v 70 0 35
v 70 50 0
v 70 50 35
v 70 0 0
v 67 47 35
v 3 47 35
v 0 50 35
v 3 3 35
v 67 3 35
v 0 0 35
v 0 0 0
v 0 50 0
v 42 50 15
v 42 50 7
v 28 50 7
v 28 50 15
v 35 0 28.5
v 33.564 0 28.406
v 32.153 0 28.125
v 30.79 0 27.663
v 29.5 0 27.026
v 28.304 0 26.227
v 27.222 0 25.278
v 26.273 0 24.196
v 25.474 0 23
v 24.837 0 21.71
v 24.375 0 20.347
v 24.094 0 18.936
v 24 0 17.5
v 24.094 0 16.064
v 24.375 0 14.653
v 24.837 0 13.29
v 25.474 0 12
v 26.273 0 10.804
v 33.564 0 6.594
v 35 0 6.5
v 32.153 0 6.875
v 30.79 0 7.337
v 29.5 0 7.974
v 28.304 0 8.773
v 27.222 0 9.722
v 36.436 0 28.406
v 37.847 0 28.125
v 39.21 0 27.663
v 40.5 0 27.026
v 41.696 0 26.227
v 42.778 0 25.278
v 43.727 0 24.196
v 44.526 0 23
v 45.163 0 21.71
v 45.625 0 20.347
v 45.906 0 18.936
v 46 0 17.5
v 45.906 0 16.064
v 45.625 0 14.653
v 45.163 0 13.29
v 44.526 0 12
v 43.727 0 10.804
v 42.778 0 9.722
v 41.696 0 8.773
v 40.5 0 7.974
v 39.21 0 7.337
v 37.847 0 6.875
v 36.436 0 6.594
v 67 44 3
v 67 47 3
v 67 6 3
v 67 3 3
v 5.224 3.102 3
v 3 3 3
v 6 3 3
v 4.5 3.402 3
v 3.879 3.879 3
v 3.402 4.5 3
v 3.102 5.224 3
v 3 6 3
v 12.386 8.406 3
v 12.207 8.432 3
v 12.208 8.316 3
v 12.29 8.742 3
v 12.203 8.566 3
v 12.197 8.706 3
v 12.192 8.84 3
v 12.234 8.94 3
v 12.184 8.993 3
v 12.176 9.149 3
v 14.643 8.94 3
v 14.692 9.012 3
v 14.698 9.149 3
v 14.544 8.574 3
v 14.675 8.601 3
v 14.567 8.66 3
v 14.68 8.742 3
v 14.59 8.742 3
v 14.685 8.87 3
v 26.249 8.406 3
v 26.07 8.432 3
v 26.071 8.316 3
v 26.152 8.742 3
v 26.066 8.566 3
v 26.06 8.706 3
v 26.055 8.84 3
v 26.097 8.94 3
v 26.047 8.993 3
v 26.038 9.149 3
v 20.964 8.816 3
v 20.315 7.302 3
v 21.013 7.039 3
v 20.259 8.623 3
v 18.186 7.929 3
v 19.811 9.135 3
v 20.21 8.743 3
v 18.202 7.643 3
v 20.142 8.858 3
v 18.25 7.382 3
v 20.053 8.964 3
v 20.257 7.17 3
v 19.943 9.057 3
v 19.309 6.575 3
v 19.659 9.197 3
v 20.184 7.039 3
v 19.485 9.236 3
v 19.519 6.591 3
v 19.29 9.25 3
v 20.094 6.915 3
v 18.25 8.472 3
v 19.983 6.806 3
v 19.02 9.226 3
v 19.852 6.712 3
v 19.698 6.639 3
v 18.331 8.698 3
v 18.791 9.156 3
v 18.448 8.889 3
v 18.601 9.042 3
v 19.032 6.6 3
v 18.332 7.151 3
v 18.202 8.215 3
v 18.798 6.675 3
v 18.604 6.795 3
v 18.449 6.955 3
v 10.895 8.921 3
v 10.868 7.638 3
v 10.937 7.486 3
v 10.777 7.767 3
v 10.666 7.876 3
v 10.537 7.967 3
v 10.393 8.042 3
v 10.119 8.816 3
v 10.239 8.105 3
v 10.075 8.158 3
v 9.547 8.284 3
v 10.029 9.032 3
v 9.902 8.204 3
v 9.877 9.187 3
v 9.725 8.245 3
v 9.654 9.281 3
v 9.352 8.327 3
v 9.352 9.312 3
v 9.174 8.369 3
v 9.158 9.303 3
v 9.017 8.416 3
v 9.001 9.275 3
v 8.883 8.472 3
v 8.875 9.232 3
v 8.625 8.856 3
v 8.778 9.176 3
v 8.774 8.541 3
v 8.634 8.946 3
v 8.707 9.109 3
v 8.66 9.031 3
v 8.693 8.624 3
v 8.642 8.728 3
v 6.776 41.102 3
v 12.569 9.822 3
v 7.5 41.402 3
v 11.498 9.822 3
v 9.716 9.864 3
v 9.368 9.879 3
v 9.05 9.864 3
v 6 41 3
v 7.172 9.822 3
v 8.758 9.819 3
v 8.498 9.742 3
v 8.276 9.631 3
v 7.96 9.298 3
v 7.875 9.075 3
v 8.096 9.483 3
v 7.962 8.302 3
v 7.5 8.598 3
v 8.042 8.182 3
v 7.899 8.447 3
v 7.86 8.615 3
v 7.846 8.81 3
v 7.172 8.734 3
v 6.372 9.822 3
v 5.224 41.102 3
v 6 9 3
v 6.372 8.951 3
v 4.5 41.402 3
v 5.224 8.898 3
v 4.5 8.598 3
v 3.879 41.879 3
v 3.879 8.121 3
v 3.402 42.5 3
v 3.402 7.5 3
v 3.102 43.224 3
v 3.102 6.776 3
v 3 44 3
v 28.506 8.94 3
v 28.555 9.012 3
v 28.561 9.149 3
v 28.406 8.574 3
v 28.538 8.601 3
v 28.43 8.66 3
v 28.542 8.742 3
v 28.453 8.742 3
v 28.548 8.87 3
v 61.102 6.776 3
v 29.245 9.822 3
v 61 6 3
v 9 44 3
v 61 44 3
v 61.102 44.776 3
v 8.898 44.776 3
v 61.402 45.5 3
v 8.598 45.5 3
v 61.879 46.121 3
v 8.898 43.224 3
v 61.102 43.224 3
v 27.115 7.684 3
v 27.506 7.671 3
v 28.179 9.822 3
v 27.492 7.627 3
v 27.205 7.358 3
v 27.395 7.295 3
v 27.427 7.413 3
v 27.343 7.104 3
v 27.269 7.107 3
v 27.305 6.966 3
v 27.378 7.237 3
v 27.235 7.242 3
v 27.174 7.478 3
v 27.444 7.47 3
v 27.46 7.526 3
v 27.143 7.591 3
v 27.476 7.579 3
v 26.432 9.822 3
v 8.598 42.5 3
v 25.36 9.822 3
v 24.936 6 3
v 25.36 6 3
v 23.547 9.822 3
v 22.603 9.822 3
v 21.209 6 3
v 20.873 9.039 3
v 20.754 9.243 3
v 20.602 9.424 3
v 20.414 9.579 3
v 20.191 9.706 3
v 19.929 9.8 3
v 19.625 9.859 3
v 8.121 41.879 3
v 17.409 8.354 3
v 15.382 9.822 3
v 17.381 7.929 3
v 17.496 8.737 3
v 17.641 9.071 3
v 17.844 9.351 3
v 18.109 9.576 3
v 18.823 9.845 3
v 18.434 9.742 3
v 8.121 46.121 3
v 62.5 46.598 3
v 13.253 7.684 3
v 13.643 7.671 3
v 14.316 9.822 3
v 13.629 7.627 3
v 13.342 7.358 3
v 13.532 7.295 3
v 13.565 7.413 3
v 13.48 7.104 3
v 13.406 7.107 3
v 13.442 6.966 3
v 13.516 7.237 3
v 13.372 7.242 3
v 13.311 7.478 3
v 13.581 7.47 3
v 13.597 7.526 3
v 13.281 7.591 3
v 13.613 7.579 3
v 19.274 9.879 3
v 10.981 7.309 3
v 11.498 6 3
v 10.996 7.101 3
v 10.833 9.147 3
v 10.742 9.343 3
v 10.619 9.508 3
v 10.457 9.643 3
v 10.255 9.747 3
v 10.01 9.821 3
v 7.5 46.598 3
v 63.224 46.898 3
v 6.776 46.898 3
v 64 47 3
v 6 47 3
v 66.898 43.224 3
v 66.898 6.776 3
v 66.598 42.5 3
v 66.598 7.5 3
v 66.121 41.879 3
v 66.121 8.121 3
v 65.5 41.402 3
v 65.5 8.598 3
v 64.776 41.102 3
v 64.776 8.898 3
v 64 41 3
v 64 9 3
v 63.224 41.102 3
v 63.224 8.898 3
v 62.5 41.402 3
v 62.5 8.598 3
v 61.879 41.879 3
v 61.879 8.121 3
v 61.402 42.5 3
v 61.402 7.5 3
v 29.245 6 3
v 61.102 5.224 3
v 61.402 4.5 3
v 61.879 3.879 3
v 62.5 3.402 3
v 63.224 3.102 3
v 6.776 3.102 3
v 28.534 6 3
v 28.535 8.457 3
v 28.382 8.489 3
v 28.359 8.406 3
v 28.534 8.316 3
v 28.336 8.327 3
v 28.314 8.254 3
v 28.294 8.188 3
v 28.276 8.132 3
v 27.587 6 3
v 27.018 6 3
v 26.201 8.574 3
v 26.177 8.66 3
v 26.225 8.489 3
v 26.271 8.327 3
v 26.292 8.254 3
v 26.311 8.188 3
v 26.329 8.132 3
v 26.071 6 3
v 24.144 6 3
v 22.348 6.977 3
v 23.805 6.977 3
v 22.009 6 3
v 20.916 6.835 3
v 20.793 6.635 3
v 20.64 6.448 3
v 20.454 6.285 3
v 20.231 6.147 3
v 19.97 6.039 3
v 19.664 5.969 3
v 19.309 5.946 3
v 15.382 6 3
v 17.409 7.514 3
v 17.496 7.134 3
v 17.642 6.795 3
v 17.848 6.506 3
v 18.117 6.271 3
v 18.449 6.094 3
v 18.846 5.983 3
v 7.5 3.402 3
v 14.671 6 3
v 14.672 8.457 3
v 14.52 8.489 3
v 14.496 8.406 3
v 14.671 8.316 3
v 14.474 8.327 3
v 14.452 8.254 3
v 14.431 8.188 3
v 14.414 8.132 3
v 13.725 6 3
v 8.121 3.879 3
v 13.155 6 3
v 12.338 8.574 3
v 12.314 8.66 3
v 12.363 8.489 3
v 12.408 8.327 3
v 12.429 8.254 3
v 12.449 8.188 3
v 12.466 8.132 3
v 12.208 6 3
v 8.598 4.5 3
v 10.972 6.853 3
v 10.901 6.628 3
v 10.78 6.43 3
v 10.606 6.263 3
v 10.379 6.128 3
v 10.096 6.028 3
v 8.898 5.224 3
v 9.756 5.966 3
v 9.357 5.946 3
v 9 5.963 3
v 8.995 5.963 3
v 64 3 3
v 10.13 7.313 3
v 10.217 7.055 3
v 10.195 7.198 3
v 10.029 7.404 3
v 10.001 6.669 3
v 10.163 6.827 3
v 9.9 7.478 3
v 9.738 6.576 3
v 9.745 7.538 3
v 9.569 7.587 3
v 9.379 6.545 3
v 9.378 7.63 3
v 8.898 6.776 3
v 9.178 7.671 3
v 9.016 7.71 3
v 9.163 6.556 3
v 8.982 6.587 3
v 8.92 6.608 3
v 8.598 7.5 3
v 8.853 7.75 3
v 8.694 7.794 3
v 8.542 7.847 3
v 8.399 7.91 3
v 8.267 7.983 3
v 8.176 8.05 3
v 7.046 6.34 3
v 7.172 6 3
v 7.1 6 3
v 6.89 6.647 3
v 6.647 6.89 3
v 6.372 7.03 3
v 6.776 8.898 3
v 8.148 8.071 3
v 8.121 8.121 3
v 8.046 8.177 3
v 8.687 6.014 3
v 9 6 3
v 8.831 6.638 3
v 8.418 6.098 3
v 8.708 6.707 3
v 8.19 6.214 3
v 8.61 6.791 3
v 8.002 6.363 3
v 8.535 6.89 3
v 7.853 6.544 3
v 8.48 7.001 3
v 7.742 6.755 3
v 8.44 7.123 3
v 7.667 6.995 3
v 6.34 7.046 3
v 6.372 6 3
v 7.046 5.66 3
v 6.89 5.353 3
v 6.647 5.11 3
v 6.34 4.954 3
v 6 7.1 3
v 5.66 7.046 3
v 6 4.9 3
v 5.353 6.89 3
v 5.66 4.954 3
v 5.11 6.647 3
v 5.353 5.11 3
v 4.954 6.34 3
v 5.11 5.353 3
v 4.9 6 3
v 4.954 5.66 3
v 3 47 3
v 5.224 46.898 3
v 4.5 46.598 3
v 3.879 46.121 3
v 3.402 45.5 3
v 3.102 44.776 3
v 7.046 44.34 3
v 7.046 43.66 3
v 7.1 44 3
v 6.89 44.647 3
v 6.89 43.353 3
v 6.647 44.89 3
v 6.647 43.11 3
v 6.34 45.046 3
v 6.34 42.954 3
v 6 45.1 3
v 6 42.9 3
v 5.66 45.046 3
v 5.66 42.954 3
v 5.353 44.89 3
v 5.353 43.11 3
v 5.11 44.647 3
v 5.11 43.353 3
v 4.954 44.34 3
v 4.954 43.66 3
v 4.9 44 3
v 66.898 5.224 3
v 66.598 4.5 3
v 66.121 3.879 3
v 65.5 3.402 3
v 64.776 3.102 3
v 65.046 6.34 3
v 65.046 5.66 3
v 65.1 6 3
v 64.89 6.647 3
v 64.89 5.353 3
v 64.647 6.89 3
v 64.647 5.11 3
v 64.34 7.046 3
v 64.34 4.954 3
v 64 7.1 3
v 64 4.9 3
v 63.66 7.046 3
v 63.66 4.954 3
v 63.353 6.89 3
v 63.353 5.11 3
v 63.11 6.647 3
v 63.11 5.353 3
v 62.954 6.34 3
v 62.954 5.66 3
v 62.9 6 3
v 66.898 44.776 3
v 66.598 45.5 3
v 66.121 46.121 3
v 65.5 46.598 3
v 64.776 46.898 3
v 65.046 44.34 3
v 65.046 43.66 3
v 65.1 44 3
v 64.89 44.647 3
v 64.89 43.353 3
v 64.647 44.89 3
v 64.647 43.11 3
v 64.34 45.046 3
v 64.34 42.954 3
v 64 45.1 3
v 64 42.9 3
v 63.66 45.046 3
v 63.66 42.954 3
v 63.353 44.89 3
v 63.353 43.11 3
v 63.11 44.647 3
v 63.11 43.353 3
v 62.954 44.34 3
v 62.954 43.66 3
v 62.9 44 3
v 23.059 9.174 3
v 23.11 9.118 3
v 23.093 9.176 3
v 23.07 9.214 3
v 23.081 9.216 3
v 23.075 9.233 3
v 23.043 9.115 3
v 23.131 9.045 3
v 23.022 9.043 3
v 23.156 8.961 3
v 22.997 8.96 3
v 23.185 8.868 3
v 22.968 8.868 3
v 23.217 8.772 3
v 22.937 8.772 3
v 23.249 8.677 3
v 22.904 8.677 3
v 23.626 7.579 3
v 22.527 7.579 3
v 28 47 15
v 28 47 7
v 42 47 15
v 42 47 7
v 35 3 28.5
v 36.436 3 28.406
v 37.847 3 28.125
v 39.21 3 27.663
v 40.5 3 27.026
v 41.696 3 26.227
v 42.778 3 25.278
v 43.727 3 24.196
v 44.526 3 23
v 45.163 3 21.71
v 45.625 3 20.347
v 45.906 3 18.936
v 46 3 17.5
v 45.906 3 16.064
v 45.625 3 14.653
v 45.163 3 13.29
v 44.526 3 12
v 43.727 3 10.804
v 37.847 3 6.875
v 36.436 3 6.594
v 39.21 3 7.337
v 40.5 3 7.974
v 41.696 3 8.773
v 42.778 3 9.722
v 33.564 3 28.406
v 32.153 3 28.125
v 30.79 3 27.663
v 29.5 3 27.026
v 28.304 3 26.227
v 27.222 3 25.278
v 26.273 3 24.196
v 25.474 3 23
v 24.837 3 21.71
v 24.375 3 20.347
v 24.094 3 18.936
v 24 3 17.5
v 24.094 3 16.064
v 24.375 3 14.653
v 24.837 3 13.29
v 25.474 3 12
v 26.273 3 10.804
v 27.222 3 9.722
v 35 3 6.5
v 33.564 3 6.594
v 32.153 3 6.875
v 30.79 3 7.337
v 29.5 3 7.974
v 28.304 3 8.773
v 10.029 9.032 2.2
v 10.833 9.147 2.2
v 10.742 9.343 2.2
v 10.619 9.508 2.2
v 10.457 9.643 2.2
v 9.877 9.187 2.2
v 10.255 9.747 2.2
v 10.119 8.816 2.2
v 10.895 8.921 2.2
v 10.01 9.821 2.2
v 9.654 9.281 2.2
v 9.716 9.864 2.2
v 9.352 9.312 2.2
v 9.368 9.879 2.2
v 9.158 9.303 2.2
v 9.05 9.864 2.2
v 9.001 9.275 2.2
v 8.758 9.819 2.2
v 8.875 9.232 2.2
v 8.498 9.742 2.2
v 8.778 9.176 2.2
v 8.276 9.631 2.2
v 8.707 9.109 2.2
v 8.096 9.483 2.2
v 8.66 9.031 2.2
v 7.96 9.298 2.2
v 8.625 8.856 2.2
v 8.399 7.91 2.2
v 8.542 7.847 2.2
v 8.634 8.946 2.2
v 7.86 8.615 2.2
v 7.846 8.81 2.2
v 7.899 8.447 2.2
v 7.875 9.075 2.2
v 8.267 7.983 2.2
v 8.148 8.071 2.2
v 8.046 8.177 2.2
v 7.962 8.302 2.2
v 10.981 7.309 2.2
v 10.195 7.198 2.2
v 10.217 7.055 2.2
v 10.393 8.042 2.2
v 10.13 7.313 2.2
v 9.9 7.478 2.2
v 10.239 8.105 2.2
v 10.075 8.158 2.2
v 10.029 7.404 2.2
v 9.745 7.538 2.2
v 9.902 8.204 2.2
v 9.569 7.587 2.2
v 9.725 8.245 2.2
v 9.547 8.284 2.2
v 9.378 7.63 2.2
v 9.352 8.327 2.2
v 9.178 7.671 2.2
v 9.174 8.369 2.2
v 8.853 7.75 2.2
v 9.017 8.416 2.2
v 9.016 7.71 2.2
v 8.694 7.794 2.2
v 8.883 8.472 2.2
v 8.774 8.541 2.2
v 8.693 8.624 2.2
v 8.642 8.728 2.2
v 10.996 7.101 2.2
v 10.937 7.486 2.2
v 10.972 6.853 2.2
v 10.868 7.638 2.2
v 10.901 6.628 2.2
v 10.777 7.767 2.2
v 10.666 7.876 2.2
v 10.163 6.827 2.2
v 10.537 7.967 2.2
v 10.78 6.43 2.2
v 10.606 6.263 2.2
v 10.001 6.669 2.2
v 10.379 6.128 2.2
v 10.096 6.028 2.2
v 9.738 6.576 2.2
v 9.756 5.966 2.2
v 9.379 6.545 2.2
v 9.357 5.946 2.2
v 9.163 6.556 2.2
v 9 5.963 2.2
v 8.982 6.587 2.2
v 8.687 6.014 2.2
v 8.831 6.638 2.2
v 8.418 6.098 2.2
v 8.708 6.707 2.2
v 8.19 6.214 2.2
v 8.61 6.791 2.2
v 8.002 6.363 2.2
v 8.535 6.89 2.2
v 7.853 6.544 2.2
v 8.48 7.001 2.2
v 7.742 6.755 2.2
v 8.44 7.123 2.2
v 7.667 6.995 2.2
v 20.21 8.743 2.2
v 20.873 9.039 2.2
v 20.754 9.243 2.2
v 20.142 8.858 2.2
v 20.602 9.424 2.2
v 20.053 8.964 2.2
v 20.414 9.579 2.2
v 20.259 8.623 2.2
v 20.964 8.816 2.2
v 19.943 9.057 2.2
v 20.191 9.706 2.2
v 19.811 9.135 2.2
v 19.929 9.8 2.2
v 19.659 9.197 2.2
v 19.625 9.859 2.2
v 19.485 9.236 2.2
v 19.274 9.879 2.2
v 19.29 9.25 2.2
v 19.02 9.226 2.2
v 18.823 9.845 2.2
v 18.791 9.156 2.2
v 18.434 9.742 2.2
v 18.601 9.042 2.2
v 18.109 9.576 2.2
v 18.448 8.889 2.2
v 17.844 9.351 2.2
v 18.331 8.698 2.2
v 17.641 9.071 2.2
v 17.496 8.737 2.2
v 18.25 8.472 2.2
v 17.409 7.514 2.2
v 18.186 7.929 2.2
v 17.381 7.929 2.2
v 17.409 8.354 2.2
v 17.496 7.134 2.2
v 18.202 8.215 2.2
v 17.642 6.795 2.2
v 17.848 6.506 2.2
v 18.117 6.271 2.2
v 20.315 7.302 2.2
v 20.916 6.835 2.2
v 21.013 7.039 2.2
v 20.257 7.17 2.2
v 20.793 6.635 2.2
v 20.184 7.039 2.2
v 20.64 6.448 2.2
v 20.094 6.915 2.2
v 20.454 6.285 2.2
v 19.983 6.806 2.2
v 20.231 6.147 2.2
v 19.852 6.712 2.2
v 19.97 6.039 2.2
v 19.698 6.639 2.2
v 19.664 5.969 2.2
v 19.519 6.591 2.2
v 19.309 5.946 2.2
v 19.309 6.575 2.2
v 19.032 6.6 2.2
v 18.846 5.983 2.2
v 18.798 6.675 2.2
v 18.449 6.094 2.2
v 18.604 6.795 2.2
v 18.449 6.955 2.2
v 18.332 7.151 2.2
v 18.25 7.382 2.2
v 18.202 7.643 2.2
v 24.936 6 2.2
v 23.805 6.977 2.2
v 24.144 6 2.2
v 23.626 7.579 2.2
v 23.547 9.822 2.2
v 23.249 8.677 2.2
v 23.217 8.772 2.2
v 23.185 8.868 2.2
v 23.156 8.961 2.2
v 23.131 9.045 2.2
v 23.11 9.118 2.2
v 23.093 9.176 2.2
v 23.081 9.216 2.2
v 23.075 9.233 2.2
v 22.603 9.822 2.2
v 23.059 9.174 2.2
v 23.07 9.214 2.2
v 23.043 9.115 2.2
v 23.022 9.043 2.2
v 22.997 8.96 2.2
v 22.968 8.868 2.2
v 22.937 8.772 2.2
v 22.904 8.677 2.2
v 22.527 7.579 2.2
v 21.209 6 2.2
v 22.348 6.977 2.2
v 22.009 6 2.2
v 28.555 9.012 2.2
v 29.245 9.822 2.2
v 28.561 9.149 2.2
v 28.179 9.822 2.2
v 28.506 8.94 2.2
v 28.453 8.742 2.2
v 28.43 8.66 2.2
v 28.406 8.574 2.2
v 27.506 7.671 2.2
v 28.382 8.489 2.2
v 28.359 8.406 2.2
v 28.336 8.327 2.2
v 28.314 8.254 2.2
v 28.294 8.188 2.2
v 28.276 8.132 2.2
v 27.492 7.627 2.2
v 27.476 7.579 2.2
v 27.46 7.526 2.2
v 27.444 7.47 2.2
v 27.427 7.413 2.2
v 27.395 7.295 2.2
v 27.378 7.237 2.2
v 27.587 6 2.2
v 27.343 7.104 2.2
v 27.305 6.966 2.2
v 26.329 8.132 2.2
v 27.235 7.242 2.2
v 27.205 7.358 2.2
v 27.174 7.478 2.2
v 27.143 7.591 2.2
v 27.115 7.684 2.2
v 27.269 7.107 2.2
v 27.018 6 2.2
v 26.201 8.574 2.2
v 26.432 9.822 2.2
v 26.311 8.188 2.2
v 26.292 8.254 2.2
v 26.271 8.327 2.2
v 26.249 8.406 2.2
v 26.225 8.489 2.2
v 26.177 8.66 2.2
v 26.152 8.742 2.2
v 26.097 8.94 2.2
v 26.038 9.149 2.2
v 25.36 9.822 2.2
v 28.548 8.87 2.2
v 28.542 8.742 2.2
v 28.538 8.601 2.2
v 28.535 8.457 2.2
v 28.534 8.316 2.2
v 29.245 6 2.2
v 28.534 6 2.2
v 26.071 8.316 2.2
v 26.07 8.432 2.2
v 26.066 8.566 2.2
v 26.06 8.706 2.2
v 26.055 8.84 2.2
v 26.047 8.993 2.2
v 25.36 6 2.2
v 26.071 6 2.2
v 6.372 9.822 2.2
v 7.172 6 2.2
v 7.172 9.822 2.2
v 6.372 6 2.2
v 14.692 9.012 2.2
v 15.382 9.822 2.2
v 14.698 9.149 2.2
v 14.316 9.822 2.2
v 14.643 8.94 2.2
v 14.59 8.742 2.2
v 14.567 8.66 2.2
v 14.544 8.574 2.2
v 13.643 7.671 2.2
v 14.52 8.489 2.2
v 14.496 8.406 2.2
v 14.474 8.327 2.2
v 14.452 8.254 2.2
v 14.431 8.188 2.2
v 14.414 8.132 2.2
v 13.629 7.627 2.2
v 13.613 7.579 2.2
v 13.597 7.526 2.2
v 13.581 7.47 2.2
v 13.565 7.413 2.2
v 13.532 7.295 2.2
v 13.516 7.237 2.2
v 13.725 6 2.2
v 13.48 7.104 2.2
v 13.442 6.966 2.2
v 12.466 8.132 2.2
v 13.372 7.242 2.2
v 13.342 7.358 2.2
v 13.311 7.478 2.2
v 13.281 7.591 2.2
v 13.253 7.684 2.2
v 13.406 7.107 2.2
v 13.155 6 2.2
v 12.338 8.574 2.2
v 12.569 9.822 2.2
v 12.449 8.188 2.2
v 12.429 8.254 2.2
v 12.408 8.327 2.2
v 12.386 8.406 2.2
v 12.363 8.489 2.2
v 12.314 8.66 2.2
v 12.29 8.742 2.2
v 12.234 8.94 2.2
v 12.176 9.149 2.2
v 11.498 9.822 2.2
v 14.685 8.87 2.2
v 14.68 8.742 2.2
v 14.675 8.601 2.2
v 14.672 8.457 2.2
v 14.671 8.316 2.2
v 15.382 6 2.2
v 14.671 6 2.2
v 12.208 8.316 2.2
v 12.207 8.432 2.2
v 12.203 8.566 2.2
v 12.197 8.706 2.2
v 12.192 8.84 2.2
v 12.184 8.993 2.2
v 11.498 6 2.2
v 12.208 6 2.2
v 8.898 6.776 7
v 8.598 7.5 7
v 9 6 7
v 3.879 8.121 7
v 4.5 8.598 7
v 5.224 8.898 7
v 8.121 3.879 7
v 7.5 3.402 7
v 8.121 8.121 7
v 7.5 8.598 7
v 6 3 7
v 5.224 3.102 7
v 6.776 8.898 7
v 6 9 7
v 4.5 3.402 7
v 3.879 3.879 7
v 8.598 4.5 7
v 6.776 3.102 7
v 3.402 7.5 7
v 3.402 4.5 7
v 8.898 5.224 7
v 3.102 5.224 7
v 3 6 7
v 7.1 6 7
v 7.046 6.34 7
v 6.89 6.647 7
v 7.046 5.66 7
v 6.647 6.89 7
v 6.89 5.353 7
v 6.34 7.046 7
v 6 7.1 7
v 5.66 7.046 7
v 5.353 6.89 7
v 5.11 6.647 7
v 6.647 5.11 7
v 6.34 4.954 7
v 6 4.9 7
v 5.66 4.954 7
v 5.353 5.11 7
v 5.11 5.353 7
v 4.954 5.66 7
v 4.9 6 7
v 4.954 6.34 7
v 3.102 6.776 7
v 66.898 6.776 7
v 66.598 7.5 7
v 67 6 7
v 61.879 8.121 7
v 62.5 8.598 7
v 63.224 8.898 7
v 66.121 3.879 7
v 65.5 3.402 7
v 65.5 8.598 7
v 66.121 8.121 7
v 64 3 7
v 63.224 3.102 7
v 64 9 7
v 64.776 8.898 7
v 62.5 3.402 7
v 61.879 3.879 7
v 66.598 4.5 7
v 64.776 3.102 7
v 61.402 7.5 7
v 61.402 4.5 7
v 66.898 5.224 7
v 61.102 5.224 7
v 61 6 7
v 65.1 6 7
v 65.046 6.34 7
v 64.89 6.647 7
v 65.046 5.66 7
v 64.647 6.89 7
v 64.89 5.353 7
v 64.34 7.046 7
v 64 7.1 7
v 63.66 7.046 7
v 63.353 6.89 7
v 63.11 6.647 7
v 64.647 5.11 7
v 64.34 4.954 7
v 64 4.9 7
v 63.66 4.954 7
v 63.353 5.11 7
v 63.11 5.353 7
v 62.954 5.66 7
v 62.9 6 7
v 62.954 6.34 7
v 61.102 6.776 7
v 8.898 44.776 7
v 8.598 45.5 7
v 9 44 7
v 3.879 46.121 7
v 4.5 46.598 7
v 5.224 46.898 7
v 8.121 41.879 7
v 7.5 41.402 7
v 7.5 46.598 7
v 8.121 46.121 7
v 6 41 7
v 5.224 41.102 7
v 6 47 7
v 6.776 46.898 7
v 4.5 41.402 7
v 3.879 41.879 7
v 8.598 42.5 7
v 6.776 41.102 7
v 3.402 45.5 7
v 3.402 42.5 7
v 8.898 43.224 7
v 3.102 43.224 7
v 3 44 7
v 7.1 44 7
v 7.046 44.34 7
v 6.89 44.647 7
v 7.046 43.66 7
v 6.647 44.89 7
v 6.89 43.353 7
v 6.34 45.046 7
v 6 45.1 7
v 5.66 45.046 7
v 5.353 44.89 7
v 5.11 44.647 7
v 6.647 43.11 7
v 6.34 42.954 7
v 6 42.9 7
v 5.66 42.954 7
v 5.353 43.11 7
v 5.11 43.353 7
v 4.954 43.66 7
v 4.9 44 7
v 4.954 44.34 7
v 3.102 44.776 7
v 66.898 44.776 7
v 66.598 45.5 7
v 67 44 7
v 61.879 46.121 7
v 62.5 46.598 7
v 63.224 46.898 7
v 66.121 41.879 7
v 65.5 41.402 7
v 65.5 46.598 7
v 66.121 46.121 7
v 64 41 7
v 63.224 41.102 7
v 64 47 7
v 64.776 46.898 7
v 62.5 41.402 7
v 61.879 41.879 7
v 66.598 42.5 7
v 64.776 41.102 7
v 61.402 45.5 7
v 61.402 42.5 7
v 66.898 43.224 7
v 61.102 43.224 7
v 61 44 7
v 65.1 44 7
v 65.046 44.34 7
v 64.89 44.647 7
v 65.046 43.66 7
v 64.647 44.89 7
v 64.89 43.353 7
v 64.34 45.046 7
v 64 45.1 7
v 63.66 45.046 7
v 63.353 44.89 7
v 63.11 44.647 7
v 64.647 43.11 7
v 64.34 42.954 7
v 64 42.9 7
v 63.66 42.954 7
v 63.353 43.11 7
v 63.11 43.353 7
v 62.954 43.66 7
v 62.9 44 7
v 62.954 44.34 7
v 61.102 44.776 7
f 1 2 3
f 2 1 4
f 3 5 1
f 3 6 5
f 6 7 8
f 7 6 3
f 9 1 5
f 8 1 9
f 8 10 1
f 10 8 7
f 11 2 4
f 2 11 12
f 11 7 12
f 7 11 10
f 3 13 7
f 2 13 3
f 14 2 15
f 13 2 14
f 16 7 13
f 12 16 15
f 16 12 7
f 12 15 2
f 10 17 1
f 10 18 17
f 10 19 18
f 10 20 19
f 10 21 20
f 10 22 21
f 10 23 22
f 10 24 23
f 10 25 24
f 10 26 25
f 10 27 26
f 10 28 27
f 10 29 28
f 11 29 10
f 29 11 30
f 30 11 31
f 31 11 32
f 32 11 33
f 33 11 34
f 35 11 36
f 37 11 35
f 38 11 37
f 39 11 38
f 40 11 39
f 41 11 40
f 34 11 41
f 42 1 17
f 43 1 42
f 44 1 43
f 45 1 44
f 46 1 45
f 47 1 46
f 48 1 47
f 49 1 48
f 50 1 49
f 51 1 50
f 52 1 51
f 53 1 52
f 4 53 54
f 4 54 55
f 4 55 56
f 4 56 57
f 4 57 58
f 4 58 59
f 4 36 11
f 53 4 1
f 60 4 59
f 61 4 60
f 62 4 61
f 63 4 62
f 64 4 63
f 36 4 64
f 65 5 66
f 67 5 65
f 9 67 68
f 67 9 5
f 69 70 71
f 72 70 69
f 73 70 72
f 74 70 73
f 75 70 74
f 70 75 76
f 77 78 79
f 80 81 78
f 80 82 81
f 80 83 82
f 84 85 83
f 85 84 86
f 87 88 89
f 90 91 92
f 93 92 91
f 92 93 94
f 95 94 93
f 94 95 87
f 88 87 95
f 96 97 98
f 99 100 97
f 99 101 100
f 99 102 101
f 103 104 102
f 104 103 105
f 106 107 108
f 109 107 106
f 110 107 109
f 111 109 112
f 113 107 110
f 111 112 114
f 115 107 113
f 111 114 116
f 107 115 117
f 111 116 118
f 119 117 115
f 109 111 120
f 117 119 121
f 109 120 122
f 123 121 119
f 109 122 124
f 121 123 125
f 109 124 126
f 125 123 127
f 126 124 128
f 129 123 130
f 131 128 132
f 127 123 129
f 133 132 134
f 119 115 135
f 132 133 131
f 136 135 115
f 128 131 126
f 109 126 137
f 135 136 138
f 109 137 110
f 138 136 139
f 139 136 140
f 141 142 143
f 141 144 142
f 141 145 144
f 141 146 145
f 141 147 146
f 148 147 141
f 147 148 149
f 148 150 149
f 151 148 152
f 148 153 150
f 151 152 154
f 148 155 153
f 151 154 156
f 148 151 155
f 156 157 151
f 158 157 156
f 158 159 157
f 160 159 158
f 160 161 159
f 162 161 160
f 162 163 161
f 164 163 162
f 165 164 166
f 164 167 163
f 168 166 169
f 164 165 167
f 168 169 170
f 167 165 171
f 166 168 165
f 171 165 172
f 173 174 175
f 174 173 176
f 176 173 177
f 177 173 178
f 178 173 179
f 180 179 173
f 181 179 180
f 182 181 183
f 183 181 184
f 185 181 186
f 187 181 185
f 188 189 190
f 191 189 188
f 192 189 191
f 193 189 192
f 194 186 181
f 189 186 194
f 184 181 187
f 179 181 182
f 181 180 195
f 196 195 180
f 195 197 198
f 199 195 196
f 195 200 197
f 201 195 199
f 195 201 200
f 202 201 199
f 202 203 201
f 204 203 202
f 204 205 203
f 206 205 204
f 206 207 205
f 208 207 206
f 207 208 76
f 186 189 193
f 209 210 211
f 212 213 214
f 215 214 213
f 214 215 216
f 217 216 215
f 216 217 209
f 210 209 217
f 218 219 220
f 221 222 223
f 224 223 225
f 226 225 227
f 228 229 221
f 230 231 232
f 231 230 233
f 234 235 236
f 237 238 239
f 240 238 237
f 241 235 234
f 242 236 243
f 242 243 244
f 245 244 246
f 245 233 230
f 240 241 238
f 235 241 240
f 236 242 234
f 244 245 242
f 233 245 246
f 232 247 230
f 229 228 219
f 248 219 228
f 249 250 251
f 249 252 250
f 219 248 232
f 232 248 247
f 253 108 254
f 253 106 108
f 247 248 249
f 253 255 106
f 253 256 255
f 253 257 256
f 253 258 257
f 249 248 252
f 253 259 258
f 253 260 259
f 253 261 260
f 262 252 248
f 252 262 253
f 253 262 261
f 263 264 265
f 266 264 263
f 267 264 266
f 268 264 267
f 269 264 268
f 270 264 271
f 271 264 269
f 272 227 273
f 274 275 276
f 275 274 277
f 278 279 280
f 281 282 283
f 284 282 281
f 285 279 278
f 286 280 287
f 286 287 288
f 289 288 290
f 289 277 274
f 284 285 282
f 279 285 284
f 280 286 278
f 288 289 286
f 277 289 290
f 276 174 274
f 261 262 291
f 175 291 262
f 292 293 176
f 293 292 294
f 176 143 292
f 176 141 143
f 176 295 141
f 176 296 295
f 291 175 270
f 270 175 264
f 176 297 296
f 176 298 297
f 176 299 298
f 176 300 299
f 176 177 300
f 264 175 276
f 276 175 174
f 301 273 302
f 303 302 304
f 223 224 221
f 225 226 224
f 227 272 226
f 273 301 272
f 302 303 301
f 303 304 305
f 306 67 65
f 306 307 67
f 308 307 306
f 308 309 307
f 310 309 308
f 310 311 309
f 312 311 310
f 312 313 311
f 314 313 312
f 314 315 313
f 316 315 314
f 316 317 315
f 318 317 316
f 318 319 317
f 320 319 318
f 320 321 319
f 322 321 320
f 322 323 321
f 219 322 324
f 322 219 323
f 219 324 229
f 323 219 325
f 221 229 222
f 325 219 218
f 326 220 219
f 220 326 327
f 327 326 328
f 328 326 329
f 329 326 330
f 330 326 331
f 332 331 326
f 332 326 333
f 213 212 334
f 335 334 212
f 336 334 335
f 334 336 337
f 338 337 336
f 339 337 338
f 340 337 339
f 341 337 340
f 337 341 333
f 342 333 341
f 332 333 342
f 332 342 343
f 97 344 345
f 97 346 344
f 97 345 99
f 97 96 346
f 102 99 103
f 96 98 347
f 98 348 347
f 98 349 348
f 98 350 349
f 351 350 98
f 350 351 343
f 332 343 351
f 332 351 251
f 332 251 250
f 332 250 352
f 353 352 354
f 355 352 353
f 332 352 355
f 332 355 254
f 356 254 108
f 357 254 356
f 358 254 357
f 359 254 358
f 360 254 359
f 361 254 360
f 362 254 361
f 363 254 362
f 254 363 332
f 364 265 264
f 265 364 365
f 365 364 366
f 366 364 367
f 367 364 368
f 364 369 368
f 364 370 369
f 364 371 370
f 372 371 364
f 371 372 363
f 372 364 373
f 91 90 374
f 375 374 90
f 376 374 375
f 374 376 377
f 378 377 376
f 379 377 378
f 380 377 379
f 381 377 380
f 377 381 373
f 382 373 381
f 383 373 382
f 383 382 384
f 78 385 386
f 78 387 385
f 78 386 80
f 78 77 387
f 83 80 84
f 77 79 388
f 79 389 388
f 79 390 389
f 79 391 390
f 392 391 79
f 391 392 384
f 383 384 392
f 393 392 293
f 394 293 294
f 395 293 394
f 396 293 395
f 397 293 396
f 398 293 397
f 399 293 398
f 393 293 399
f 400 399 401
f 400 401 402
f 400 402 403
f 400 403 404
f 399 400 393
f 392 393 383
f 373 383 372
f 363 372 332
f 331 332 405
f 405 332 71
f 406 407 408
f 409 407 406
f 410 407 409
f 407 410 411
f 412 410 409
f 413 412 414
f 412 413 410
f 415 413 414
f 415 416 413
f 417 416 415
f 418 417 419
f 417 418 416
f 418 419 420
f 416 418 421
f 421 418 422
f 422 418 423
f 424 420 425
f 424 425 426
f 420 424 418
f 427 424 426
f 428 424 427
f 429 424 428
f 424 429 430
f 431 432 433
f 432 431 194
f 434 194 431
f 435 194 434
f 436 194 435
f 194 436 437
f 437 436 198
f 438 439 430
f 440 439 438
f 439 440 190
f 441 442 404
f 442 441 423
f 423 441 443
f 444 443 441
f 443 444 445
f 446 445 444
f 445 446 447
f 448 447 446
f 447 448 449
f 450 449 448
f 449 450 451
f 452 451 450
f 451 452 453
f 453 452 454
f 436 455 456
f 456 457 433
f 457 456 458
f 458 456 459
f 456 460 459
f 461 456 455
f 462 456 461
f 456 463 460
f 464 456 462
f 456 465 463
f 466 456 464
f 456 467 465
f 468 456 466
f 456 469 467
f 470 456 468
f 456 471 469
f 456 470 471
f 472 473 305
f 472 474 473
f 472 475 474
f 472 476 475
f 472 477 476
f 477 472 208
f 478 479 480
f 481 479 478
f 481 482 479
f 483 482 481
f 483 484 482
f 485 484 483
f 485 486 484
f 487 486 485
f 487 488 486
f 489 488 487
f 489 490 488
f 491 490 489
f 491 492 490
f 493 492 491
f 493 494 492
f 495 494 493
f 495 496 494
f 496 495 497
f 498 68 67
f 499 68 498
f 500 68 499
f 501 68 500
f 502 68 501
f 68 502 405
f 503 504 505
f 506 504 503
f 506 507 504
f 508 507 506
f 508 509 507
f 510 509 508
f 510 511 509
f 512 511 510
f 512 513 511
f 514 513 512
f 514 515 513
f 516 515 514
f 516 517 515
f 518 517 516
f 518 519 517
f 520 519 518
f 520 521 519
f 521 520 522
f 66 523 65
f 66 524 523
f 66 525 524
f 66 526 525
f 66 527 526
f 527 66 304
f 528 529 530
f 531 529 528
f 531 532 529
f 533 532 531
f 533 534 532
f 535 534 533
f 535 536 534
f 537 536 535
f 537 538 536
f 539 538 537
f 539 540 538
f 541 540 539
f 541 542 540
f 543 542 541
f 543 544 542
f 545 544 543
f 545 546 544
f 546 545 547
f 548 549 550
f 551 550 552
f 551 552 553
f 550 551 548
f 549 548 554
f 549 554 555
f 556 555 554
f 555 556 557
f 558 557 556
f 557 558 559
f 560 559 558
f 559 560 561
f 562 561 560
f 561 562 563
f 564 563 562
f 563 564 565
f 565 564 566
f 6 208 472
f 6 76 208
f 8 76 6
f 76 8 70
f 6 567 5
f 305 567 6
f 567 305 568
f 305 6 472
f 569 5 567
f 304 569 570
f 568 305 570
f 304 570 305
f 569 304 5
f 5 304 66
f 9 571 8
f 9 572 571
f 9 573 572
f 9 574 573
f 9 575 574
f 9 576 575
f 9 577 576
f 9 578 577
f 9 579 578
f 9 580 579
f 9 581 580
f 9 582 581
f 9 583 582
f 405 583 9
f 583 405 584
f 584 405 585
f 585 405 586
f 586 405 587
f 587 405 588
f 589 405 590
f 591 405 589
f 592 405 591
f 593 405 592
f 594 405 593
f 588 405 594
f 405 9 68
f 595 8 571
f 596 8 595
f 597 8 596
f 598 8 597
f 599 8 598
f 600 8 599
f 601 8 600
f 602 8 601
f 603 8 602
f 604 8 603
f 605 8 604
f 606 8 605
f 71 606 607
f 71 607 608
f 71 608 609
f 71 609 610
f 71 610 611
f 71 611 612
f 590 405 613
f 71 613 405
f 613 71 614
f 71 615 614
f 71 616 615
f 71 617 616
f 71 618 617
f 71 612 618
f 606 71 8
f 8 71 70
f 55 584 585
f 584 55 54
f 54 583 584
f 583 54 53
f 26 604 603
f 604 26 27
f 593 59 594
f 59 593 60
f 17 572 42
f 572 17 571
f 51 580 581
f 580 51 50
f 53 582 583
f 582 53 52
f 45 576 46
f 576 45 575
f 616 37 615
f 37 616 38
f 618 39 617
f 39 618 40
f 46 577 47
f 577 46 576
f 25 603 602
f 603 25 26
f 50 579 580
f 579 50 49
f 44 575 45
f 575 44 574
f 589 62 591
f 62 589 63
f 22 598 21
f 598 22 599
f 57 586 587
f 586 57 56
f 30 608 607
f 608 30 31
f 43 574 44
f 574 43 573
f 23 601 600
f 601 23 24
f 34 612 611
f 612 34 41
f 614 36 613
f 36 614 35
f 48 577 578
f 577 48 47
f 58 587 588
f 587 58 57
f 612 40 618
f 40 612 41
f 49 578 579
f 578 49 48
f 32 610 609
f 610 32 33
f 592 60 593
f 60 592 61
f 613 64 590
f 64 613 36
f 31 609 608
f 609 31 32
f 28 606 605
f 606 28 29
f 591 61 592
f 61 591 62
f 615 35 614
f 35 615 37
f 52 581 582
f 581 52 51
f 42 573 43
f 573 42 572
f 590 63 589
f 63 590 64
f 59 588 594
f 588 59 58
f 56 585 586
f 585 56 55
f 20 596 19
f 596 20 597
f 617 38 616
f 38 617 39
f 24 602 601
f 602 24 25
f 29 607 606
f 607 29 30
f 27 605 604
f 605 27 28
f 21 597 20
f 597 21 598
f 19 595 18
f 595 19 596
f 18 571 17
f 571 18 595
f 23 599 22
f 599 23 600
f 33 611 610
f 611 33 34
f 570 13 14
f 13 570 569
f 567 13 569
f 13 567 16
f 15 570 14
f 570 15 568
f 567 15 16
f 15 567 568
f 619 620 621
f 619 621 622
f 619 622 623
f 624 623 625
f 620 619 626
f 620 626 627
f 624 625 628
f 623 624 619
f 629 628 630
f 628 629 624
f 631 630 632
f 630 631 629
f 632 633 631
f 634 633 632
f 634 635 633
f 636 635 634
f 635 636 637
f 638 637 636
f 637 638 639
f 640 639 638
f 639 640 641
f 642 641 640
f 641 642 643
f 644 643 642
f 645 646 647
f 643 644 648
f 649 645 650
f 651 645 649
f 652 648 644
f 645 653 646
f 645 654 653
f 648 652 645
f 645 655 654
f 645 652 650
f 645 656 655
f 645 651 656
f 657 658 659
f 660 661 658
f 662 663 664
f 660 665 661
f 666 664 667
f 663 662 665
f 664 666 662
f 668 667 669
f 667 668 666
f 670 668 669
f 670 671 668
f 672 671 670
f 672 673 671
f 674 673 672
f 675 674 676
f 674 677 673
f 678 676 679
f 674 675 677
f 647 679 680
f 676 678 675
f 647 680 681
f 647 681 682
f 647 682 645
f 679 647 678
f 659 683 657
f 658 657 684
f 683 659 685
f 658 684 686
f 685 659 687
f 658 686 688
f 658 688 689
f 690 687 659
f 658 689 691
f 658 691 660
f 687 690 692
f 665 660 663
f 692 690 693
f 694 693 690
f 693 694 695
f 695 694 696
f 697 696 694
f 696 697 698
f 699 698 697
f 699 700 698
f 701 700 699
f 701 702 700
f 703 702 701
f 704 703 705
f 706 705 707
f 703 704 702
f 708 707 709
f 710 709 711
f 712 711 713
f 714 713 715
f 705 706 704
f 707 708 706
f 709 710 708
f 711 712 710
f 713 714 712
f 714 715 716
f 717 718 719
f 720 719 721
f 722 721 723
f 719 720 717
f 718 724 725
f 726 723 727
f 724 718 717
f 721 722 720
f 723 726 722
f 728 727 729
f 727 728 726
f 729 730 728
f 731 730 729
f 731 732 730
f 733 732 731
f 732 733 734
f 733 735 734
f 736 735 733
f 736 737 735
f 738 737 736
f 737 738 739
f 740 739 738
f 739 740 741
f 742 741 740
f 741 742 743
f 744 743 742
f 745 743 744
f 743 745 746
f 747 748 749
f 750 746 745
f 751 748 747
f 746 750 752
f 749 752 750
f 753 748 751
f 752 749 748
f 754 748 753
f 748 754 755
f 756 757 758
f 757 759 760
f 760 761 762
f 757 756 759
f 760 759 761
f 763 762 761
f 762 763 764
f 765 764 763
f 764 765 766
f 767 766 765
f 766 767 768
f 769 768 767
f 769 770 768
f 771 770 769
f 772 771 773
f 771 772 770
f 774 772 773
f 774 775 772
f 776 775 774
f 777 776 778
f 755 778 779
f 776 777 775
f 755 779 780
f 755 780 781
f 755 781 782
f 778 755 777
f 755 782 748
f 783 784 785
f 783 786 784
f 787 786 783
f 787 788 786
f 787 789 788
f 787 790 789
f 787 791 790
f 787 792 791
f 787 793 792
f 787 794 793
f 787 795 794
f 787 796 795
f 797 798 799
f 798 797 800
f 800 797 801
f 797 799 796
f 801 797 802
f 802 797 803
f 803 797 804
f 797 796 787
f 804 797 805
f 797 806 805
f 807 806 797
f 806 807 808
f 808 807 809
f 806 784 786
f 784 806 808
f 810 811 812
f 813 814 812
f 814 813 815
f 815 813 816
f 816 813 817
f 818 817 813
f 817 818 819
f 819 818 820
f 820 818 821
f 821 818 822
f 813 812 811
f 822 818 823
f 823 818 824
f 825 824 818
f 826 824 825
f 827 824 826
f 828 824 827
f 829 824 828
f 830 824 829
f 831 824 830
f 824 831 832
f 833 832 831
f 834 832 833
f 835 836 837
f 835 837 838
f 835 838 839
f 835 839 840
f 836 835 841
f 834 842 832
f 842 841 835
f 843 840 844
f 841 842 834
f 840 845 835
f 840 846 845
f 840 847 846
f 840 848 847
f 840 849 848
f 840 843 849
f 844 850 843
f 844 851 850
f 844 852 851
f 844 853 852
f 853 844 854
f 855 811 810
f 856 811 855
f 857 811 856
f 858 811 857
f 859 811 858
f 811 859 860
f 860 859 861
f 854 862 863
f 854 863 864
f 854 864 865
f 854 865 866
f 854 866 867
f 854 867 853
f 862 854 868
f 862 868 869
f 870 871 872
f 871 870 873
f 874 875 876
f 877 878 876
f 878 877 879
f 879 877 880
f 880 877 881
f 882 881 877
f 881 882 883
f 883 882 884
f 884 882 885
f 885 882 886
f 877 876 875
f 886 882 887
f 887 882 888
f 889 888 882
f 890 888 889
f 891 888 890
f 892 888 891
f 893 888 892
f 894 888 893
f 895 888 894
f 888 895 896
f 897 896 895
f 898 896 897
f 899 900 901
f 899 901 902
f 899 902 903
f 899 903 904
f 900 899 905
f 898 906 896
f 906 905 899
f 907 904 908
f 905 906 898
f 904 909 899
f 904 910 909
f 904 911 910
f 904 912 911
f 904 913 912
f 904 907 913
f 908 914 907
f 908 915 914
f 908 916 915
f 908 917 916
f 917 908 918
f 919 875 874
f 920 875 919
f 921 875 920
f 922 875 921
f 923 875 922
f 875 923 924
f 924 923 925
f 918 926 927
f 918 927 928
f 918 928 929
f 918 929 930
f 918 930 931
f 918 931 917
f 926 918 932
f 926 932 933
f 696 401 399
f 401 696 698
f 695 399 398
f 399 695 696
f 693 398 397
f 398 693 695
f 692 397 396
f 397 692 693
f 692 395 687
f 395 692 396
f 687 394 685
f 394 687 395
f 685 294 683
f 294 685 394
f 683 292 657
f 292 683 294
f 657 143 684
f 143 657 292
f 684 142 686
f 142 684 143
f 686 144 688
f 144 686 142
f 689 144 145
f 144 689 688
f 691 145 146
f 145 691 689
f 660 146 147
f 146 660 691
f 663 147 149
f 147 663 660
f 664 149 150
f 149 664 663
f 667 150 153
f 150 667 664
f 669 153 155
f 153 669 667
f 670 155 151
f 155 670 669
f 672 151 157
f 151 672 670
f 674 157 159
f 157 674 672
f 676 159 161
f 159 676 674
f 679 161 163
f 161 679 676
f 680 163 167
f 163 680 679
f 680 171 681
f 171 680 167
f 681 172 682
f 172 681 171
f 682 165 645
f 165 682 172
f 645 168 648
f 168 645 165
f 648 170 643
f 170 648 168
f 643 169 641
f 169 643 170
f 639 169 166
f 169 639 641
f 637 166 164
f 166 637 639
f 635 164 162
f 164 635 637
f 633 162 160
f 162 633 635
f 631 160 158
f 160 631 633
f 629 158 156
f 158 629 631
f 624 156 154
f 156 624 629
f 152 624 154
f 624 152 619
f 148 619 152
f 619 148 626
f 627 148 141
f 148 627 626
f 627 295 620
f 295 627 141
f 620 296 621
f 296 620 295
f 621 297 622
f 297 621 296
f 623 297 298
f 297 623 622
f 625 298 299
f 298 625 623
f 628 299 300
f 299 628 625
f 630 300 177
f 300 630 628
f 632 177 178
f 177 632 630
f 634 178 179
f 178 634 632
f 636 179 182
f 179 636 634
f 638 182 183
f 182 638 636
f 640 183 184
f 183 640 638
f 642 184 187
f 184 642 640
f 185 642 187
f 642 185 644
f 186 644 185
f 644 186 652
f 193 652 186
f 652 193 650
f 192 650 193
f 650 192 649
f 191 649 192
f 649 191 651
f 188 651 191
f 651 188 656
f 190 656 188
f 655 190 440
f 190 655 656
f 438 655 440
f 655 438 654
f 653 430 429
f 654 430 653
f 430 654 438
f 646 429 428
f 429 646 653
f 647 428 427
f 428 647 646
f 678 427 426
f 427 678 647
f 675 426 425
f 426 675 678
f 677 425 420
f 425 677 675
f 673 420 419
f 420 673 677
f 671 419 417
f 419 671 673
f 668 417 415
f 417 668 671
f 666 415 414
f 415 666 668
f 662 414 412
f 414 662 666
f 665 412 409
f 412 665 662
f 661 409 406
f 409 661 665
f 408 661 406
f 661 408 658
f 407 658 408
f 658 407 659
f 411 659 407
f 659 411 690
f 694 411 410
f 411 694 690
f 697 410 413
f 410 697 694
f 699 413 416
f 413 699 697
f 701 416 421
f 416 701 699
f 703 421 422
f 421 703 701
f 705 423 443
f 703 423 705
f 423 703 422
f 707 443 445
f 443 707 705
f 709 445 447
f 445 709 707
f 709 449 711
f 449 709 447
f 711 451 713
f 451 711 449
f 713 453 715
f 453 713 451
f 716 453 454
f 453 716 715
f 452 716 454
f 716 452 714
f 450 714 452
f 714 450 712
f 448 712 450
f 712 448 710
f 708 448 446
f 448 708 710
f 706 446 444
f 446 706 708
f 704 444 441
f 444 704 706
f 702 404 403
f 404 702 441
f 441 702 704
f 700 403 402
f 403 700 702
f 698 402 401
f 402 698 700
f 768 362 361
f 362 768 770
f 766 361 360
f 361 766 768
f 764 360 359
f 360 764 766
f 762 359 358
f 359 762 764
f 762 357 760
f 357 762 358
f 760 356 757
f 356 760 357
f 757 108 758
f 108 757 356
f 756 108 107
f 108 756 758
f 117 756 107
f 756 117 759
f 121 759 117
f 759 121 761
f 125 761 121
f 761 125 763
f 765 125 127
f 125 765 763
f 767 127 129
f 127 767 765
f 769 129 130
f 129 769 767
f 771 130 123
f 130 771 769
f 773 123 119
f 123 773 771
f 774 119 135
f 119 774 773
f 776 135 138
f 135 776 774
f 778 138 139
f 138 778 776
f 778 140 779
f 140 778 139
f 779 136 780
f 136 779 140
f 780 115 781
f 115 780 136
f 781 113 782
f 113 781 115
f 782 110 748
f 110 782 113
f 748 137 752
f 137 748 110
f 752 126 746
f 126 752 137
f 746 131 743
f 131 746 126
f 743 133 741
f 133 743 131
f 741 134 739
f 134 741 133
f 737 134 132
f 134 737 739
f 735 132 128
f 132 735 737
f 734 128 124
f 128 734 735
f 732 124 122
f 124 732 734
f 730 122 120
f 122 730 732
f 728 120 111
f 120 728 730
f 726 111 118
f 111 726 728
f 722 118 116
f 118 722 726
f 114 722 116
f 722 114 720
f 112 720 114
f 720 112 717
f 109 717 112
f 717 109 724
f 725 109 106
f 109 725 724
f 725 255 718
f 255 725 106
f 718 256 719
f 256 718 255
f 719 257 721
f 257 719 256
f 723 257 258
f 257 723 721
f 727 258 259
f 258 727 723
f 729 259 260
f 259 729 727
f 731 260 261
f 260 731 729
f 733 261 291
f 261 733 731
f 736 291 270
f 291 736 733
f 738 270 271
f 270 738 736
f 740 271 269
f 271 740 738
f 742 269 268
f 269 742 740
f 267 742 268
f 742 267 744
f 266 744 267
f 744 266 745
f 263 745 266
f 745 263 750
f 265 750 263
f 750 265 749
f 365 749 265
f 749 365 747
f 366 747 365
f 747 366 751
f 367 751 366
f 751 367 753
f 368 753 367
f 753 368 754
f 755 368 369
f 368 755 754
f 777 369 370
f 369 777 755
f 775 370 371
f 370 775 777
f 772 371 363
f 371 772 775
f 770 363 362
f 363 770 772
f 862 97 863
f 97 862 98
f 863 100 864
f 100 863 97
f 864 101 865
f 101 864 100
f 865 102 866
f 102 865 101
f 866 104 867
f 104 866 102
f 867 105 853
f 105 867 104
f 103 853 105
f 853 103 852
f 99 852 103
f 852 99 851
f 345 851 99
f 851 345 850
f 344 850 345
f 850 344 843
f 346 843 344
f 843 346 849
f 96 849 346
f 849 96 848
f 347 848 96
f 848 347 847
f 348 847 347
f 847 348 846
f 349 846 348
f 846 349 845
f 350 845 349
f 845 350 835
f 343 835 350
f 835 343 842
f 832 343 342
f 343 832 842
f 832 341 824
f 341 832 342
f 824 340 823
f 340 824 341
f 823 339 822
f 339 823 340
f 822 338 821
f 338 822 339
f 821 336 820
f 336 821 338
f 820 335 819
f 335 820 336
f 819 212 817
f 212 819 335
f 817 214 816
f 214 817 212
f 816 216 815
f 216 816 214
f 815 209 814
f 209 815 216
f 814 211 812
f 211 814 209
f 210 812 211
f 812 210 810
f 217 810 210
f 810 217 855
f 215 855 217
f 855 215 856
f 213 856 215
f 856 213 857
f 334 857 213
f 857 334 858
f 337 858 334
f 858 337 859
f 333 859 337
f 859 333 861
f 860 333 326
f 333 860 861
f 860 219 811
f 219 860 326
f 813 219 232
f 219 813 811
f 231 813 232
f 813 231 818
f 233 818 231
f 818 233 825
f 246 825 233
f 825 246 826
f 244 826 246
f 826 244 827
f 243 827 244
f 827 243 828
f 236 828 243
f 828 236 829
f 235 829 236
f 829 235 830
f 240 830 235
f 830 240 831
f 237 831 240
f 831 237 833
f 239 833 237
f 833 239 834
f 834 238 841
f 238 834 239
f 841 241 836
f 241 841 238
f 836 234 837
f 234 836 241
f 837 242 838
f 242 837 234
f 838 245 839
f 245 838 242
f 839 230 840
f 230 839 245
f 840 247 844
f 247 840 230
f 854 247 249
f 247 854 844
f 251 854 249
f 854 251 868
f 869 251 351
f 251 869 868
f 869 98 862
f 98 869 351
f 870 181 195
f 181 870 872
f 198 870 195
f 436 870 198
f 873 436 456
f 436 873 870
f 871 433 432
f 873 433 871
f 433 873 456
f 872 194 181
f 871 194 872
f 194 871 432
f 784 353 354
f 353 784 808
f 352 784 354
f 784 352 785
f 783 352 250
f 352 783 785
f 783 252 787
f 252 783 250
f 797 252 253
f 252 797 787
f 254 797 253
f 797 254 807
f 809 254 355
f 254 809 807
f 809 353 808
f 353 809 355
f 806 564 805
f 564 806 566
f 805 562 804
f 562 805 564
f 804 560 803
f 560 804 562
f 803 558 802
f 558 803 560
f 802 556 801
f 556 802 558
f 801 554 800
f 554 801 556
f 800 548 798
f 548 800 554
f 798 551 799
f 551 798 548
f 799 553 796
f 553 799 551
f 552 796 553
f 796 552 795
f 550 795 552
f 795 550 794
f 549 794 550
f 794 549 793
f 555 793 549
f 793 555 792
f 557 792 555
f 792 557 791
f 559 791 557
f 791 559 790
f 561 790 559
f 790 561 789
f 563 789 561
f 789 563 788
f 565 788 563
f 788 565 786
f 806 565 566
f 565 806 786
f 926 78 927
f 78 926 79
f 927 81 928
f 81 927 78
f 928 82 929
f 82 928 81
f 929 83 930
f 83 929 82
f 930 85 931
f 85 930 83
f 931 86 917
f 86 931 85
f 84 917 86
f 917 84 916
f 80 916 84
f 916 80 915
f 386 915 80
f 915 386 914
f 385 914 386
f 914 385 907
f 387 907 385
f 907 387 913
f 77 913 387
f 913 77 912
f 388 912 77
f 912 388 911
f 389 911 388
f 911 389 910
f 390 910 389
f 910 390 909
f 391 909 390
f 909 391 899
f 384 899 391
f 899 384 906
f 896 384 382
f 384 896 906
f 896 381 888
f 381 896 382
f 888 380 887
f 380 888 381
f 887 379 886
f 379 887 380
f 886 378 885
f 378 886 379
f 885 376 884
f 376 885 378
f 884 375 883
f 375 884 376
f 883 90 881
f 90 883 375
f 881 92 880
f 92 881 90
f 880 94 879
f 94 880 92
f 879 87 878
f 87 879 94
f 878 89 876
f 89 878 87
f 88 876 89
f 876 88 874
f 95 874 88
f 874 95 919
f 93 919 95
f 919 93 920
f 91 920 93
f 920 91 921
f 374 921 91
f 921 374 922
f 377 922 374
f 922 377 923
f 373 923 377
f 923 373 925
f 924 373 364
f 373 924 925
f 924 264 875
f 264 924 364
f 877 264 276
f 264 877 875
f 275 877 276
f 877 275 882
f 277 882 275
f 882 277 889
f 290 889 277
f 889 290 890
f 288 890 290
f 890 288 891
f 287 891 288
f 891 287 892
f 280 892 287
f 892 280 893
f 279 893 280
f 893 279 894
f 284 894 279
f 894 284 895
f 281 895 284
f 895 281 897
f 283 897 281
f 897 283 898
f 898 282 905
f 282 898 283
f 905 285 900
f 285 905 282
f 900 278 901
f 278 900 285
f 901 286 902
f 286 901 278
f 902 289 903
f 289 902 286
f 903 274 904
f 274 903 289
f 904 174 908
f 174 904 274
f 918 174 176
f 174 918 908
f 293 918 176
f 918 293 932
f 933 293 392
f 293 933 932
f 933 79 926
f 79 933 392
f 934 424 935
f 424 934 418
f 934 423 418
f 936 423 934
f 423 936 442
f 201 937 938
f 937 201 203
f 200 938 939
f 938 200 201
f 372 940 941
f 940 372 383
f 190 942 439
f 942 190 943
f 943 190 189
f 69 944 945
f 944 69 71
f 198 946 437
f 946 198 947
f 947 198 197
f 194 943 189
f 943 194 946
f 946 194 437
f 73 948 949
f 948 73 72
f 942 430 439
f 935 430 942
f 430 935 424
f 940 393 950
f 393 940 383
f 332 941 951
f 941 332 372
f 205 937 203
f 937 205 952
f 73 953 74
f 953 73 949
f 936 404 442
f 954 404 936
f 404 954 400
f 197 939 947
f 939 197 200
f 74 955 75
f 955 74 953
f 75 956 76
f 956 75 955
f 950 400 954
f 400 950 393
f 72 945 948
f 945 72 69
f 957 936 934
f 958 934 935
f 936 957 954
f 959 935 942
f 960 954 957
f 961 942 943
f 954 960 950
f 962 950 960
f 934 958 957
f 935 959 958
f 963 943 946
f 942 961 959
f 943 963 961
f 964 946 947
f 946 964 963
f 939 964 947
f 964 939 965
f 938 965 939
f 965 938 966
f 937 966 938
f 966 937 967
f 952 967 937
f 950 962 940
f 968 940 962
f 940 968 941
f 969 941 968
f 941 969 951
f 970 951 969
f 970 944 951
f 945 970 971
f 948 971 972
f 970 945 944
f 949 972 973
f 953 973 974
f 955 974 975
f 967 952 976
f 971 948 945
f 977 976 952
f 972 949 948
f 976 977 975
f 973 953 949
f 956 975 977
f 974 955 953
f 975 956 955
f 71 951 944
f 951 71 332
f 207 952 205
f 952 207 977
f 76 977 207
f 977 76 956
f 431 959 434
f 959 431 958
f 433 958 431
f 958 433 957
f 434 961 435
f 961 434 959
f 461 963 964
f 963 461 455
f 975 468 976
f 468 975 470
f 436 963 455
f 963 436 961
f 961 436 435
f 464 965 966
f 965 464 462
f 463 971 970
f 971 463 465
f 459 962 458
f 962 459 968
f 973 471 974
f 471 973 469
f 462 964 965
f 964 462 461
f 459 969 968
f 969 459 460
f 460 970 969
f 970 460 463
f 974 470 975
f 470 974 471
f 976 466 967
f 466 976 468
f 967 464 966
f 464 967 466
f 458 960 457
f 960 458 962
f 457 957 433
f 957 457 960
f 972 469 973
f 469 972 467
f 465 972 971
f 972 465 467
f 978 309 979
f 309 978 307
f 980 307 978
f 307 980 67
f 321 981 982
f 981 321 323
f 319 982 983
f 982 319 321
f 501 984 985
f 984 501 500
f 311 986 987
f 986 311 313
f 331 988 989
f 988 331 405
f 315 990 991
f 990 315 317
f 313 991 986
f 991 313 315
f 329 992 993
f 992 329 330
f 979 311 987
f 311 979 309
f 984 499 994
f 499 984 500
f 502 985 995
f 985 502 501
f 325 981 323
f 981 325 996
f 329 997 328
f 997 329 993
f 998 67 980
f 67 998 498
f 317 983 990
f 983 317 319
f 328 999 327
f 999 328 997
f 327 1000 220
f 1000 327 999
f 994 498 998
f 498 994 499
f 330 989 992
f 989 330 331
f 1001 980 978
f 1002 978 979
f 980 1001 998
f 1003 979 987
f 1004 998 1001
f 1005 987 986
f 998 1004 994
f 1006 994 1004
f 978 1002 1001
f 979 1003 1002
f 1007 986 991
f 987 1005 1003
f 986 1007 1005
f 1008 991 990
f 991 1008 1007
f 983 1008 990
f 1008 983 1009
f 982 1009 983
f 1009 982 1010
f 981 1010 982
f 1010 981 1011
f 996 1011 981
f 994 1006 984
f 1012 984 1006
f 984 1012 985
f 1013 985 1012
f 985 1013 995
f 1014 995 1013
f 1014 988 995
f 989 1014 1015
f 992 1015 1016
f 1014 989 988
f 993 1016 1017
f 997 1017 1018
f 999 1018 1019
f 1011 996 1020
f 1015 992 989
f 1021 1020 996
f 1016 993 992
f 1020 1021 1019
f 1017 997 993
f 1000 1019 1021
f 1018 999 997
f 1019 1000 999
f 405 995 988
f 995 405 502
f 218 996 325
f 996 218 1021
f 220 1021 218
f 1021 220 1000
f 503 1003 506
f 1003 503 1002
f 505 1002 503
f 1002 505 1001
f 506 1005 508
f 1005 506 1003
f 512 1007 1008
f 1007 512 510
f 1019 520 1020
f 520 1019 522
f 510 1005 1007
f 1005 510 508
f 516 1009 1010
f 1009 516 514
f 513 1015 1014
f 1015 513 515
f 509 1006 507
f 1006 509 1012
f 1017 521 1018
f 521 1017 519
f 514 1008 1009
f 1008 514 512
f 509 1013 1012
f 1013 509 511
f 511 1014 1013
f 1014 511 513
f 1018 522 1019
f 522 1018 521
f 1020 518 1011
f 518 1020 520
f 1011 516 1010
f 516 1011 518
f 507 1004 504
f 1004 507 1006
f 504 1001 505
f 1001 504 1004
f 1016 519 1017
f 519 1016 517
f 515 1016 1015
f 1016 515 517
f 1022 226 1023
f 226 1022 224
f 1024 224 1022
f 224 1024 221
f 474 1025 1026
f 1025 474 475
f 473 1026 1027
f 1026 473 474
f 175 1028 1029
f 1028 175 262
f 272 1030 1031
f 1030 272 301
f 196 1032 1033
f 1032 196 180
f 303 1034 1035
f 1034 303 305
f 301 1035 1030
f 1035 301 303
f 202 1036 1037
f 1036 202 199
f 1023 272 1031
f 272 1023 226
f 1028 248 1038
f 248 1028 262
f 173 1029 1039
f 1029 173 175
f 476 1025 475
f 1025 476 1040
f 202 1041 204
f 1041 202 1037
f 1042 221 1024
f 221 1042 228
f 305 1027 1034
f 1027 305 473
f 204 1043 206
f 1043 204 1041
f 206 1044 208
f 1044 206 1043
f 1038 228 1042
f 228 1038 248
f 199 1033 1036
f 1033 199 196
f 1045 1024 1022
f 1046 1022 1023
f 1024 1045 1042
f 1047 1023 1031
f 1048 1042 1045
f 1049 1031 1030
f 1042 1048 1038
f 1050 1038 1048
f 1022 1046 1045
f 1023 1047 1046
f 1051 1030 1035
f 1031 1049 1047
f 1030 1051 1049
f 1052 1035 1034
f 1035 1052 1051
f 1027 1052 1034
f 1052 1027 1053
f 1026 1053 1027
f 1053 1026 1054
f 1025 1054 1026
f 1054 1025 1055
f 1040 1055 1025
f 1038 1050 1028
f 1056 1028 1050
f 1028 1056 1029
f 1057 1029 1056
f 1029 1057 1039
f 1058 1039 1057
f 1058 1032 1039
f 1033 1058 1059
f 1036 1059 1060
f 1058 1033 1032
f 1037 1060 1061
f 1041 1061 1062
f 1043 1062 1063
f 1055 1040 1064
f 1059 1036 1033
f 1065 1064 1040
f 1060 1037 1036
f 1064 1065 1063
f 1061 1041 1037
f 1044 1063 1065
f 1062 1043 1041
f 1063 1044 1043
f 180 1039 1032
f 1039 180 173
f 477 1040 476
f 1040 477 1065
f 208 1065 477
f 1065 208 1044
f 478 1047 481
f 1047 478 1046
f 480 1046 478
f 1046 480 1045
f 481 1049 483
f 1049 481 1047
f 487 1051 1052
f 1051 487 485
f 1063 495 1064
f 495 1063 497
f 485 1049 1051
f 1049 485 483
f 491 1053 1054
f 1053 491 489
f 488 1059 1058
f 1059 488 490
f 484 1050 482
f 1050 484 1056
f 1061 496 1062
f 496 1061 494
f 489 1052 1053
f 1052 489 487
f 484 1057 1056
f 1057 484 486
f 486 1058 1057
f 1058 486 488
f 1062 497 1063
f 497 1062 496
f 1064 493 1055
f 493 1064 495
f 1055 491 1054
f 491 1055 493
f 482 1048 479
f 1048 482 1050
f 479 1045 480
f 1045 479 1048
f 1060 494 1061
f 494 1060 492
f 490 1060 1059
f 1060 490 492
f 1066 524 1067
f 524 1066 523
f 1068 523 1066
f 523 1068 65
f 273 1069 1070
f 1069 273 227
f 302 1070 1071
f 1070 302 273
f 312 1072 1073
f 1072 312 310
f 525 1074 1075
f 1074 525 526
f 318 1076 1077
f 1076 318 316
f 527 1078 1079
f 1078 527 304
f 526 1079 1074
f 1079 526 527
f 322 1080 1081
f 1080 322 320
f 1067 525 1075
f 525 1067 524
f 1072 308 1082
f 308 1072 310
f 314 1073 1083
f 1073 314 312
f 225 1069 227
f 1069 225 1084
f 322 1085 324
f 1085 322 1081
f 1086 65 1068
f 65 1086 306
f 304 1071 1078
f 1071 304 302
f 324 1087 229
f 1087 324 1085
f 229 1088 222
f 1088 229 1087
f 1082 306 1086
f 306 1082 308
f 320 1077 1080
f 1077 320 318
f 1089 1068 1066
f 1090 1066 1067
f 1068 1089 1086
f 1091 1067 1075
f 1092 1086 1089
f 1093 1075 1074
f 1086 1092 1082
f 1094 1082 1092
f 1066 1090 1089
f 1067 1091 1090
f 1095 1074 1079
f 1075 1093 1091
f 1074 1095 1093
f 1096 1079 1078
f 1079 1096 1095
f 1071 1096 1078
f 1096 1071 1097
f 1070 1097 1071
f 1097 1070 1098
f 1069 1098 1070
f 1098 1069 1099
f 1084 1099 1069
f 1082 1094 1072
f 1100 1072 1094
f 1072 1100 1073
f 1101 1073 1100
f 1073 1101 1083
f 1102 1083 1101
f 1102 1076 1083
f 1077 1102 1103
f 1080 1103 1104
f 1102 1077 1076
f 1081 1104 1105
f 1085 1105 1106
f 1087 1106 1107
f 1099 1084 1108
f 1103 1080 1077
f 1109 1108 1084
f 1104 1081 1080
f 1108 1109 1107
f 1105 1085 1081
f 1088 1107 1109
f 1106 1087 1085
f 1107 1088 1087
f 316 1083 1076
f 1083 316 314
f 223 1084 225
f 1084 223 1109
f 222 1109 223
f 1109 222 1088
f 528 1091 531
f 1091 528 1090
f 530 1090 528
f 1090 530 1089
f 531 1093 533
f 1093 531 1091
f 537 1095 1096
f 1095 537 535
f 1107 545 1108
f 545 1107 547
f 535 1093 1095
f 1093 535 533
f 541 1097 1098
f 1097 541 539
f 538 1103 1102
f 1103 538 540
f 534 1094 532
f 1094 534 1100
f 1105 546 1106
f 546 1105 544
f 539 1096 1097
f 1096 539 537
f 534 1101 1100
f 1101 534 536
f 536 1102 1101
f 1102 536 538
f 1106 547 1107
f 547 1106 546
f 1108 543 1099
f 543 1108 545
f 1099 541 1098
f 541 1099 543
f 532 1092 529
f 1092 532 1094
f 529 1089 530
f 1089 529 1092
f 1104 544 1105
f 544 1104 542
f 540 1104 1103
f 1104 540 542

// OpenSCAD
// ISM Camera shell — body + lens tube (original ISM)
body_w=70; body_d=50; body_h=35; wall=3;
pcb_w=80; pcb_h=55; // control board sits behind
usb_w=14; usb_h=8; mount_d=2.2; badge_depth=0.8;
lens_od=28; lens_id=22; lens_len=18;

module body(){difference(){
  cube([body_w,body_d,body_h]);
  translate([wall,wall,wall])cube([body_w-2*wall,body_d-2*wall,body_h]);
  translate([body_w/2, -1, body_h/2])rotate([-90,0,0])cylinder(h=wall+4,d=lens_id,$fn=48);
  translate([body_w/2-usb_w/2,body_d-wall-1,wall+4])cube([usb_w,wall+4,usb_h]);
  translate([6,6,wall-badge_depth])linear_extrude(height=badge_depth+0.1)
    text("ISM CAM",size=4,font="Liberation Sans:style=Bold");
}for(p=[[6,6],[body_w-6,6],[6,body_d-6],[body_w-6,body_d-6]])
  translate([p[0],p[1],wall])difference(){cylinder(h=4,d=6,$fn=24);translate([0,0,-0.1])cylinder(h=5,d=mount_d,$fn=20);}}

module lens_tube(){difference(){
  cylinder(h=lens_len,d=lens_od,$fn=48);
  translate([0,0,-1])cylinder(h=lens_len+2,d=lens_id,$fn=48);
}}

module back_plate(){difference(){
  cube([body_w+2,body_d+2,wall]);
  translate([body_w/2-usb_w/2+1,body_d-2,-1])cube([usb_w,wall+4,wall+2]);
}}

body();
